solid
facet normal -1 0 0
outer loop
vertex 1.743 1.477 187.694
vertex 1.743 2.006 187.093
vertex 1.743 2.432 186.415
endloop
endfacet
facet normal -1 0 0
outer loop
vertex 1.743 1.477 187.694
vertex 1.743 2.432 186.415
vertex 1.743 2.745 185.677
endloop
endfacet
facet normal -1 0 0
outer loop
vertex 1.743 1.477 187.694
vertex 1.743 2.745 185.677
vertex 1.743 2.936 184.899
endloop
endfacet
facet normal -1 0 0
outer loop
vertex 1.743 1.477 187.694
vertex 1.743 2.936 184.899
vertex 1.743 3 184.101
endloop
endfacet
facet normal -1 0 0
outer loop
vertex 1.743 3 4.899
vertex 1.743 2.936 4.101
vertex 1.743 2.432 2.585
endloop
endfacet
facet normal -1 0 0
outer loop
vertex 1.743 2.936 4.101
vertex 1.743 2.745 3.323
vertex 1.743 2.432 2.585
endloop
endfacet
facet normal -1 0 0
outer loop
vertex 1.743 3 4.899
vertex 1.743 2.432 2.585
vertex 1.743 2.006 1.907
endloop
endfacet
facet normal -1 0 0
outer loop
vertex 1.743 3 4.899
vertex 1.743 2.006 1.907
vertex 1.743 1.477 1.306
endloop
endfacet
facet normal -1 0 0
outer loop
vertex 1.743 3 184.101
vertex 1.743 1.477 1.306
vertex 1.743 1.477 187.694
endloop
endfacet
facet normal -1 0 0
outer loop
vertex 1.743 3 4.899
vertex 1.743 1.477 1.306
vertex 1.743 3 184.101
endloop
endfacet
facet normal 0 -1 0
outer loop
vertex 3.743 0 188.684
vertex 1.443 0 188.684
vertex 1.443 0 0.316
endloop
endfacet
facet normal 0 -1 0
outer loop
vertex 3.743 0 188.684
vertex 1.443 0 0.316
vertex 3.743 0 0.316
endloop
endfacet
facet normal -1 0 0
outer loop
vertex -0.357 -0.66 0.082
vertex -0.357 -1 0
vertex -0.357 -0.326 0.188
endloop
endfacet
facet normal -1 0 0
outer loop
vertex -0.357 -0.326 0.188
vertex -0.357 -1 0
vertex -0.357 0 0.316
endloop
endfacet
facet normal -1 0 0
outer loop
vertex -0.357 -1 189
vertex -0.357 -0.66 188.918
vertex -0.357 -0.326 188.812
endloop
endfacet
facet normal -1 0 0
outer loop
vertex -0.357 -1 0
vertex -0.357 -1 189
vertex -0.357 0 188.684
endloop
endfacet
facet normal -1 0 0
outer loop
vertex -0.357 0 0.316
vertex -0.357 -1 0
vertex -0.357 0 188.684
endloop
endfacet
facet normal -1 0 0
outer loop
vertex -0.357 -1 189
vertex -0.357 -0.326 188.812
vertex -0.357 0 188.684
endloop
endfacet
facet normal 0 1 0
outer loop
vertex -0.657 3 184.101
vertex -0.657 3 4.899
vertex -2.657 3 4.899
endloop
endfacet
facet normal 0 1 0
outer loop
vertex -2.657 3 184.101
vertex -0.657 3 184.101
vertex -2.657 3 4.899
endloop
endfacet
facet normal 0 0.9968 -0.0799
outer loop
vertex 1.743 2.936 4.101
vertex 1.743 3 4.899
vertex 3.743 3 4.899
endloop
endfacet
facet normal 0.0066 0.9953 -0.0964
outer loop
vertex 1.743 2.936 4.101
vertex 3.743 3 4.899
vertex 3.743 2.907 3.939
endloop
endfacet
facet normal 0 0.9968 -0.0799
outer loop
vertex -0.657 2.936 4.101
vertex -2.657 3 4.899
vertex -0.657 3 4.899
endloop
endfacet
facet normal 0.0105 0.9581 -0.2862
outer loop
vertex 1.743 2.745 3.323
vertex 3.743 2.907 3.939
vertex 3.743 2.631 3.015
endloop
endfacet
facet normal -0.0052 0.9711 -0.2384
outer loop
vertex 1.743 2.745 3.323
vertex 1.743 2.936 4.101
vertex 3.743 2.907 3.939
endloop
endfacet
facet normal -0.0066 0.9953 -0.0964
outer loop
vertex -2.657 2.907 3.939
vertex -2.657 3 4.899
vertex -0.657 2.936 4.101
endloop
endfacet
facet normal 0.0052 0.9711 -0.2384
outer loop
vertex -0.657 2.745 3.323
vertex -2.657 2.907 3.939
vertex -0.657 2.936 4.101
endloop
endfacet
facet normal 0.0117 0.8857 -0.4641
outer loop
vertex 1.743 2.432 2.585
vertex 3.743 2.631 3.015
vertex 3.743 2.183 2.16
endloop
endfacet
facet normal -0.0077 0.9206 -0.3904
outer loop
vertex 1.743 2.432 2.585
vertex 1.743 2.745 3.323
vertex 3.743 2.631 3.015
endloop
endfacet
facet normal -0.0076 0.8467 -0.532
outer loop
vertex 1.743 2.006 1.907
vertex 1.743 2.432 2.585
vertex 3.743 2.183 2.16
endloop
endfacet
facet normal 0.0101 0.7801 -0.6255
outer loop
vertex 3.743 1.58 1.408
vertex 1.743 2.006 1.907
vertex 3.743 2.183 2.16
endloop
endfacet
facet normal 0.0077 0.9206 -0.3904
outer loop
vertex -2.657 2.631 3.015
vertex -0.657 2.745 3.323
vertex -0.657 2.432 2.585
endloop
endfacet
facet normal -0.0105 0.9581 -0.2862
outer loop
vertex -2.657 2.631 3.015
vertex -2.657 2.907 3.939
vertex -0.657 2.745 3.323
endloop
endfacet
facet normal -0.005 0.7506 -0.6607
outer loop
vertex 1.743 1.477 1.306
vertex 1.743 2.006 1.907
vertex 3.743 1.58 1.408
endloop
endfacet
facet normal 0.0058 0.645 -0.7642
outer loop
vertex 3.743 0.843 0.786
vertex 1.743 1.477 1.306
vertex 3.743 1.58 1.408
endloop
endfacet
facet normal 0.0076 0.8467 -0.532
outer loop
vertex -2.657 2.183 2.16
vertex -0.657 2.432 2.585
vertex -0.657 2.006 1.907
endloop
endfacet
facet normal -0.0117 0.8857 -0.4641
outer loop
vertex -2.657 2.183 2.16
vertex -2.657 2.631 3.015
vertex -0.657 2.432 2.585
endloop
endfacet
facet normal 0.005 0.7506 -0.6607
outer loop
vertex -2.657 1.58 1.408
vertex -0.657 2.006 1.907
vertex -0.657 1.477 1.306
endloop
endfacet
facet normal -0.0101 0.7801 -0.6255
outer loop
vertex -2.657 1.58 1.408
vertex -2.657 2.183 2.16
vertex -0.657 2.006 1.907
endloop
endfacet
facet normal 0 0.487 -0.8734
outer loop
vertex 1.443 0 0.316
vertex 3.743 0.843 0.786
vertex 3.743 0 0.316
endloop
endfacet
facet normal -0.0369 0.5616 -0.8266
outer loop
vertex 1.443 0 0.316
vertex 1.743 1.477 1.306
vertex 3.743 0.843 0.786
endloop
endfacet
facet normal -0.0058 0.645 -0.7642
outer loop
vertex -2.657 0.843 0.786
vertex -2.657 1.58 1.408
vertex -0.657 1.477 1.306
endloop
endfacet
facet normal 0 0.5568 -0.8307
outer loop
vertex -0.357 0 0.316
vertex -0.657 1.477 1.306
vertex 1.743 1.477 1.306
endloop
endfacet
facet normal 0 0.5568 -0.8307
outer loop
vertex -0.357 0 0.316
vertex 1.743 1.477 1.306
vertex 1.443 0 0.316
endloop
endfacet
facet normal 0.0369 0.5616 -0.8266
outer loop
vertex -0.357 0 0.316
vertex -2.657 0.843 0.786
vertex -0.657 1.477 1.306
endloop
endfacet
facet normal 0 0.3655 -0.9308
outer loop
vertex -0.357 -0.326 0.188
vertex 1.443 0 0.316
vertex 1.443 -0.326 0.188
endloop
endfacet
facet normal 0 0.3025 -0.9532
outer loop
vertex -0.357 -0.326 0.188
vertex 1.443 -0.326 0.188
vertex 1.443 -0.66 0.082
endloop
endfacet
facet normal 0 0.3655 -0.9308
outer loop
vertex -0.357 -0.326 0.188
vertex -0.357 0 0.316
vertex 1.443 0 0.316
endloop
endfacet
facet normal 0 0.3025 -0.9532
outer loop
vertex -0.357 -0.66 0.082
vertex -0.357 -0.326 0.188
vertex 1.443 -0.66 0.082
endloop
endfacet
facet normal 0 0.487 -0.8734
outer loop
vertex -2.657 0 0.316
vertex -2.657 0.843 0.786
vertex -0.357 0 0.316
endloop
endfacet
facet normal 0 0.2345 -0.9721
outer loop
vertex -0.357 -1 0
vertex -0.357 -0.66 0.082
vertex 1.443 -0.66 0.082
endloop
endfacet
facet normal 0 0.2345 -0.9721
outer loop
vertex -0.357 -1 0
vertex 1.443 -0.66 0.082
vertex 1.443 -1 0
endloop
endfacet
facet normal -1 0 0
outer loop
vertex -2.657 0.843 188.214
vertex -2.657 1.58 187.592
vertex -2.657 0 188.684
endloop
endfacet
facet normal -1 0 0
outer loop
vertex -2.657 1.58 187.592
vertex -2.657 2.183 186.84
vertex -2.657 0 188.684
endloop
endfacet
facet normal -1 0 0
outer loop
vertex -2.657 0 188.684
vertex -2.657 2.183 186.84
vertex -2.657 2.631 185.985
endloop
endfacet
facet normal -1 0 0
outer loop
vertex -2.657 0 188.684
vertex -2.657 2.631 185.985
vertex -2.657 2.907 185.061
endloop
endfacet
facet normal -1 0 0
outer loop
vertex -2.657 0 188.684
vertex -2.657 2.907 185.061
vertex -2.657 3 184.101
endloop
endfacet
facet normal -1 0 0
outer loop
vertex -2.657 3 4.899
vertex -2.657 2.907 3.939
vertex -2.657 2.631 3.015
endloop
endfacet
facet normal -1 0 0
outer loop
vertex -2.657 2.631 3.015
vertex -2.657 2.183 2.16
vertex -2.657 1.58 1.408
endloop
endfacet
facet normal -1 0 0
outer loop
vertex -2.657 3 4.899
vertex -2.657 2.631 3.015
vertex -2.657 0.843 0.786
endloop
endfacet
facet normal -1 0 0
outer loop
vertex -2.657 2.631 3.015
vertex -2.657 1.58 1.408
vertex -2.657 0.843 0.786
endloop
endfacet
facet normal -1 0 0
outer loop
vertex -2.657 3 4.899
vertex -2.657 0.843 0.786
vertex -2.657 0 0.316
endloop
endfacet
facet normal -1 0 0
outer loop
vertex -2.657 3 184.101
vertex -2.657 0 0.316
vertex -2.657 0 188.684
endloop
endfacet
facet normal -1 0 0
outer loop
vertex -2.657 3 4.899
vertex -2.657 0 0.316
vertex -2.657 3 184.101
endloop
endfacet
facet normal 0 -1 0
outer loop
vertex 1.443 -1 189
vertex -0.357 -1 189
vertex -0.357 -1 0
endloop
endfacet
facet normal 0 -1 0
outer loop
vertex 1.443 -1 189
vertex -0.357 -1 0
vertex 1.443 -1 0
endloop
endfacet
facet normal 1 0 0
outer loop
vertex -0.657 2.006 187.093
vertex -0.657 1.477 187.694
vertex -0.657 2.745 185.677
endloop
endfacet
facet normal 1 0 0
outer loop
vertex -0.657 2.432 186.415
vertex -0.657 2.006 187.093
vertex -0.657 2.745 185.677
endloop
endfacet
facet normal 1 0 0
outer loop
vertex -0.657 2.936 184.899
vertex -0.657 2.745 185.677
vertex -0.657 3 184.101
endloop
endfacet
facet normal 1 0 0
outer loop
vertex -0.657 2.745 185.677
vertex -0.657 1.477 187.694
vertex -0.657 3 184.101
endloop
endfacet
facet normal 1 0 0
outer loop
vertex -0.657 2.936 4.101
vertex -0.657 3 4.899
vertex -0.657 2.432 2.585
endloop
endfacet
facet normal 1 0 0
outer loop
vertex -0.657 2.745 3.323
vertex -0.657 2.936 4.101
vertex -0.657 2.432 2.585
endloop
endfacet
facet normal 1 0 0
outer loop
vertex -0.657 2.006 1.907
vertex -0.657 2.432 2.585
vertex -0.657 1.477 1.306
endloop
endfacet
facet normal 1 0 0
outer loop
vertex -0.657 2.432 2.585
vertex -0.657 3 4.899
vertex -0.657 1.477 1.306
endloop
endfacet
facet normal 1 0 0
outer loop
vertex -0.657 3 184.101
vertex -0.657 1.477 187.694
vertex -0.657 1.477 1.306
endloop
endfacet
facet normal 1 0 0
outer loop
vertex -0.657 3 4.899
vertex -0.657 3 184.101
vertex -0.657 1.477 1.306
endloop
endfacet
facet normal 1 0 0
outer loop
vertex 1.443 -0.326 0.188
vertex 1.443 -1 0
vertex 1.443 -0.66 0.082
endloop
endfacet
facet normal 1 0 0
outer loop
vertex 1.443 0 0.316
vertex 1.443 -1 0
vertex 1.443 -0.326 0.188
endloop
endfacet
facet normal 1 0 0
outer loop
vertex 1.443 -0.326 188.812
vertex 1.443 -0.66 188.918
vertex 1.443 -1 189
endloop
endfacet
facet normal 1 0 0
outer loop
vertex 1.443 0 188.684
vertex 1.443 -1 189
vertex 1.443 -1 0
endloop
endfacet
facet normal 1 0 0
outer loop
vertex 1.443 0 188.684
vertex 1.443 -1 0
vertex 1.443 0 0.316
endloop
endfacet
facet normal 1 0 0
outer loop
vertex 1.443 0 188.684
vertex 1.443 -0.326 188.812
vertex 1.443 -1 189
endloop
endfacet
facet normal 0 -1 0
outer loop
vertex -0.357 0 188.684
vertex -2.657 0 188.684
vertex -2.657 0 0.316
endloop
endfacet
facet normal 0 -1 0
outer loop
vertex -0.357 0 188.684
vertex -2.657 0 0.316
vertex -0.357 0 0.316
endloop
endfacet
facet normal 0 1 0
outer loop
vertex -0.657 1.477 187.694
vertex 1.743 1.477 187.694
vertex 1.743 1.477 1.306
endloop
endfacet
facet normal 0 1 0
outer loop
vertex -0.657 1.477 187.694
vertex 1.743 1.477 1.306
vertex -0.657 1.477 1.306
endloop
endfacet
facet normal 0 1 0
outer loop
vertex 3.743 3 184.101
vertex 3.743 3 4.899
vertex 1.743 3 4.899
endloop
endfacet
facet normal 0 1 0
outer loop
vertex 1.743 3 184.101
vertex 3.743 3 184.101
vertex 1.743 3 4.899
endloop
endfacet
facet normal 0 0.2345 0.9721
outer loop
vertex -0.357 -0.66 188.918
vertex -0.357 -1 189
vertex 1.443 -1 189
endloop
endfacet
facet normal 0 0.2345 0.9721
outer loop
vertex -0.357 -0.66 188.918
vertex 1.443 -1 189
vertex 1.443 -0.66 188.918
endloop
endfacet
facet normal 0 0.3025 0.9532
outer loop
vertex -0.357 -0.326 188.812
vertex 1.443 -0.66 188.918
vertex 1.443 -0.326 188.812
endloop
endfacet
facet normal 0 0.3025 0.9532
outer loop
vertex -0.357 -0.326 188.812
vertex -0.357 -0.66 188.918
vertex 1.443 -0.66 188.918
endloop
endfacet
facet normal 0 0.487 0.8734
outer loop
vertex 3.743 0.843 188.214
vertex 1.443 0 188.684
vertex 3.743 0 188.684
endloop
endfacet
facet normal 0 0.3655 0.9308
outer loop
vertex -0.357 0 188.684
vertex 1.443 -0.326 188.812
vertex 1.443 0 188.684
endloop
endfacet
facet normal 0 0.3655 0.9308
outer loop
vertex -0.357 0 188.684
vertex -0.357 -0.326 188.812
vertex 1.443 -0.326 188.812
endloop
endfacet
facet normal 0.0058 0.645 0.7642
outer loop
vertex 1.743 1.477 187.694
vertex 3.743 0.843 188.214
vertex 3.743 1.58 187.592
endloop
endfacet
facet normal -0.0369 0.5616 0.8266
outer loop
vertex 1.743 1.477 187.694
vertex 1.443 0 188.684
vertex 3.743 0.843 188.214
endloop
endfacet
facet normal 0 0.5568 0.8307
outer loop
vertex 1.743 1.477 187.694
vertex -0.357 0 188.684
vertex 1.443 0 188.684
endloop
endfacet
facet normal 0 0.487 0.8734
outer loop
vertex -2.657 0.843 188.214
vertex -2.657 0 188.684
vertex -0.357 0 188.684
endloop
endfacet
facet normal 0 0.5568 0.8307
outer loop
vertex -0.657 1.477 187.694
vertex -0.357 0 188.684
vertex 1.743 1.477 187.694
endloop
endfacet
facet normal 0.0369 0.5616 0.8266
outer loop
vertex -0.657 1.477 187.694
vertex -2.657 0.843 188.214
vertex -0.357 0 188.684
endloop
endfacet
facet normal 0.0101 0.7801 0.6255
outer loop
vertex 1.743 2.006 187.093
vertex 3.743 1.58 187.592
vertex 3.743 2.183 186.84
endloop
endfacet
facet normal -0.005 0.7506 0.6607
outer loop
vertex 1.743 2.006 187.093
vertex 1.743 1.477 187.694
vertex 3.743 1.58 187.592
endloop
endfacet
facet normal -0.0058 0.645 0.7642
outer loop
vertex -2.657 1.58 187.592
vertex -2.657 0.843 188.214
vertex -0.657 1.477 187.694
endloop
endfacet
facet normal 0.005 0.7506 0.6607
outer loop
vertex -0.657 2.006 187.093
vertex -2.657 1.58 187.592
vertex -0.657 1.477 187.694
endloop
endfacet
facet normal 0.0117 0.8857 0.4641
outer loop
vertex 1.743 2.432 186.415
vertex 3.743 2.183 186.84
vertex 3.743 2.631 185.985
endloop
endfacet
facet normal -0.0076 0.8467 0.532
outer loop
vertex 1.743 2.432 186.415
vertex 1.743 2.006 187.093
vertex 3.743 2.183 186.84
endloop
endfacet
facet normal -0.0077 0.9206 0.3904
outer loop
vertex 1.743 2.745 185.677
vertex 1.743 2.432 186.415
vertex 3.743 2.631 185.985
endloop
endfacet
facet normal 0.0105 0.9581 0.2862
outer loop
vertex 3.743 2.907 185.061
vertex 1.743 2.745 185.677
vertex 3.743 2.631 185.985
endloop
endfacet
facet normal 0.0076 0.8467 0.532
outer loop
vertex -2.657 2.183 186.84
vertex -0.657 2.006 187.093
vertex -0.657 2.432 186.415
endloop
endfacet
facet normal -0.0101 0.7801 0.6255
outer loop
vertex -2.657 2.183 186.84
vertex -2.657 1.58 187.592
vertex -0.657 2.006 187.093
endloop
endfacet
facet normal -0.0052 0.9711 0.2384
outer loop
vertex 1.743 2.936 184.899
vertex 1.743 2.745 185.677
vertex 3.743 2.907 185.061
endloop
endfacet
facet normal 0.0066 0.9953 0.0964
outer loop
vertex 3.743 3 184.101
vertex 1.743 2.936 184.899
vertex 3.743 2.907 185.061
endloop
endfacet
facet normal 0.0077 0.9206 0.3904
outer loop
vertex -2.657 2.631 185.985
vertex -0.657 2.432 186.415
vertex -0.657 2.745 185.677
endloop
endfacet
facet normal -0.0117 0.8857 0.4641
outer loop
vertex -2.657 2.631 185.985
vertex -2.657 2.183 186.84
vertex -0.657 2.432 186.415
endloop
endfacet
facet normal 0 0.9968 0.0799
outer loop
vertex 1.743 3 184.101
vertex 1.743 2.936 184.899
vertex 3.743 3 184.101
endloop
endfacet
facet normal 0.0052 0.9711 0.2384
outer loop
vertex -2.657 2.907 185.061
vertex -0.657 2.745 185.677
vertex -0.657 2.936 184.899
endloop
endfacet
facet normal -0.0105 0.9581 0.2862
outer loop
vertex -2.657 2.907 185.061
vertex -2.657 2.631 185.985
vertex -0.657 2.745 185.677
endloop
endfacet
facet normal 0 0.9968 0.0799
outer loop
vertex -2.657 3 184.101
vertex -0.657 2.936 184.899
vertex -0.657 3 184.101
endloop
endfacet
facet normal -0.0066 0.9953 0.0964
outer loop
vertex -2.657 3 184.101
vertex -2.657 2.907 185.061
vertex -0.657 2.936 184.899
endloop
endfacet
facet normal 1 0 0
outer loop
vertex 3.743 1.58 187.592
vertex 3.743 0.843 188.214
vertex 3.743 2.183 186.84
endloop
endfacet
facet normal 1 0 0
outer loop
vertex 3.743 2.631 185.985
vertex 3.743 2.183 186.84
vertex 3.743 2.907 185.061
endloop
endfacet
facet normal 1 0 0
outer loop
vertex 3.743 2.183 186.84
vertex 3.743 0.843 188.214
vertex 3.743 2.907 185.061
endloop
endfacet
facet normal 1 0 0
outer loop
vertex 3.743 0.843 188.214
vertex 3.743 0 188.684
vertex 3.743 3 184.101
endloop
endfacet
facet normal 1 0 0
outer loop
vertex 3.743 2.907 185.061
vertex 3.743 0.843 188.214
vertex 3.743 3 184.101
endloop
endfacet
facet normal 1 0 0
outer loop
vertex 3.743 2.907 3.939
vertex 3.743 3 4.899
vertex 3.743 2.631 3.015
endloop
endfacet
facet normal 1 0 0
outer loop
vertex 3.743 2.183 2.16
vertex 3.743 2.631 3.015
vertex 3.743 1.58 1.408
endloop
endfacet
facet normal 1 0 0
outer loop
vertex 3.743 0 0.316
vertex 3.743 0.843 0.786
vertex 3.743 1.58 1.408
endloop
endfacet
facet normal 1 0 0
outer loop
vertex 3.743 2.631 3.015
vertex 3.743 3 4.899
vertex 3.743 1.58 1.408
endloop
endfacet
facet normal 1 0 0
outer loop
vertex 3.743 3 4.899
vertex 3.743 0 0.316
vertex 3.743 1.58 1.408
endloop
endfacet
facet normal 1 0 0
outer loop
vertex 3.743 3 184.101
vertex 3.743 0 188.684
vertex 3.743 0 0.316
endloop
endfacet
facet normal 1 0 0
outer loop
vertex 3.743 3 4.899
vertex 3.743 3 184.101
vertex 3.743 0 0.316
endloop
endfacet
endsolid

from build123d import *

# Parameters (mm, degrees)
BOSS_EXTRUDE1_DEPTH = 189
SKETCH3_W           = 1.8
SKETCH3_H           = 1
BOSS_EXTRUDE2_DEPTH = 189
FILLET1_START       = -4
FILLET1_DEPTH       = 9


with BuildPart() as part:
    # Sketch1 → Boss-Extrude1 (new body)
    with BuildSketch(Plane.XY):
        Polygon((-2.657407407, 0), (3.742592593, 0), (3.742592593, 3), (1.742592593, 3), (1.742592593, 1.476851852), (-0.657407407, 1.476851852), (-0.657407407, 3), (-2.657407407, 3), align=None)
    extrude(amount=BOSS_EXTRUDE1_DEPTH)

    # Sketch3 → Boss-Extrude2 (add)
    with BuildSketch(Plane.XY.offset(189)):
        with Locations((0.542592593, -0.5)):
            Rectangle(SKETCH3_W, SKETCH3_H)
    extrude(amount=-BOSS_EXTRUDE2_DEPTH)

    # Fillet1: read off the stored shape, not the designer's step
    # Fillet1 outline → Fillet1 (cut)
    with BuildSketch(Plane.YZ.offset(FILLET1_START)):
        with BuildLine():
            Line((-1, 0), (3, 0))
            Line((3, 0), (3, 4.898979486))
            ThreePointArc((3, 4.898979486), (1.872983346, 1.736701826), (-1, 0))
        make_face()
        with BuildLine():
            ThreePointArc((-1, 189), (1.872983346, 187.263298174), (3, 184.101020514))
            Line((3, 184.101020514), (3, 189))
            Line((3, 189), (-1, 189))
        make_face()
    extrude(amount=FILLET1_DEPTH, mode=Mode.SUBTRACT)


solid = part.part
